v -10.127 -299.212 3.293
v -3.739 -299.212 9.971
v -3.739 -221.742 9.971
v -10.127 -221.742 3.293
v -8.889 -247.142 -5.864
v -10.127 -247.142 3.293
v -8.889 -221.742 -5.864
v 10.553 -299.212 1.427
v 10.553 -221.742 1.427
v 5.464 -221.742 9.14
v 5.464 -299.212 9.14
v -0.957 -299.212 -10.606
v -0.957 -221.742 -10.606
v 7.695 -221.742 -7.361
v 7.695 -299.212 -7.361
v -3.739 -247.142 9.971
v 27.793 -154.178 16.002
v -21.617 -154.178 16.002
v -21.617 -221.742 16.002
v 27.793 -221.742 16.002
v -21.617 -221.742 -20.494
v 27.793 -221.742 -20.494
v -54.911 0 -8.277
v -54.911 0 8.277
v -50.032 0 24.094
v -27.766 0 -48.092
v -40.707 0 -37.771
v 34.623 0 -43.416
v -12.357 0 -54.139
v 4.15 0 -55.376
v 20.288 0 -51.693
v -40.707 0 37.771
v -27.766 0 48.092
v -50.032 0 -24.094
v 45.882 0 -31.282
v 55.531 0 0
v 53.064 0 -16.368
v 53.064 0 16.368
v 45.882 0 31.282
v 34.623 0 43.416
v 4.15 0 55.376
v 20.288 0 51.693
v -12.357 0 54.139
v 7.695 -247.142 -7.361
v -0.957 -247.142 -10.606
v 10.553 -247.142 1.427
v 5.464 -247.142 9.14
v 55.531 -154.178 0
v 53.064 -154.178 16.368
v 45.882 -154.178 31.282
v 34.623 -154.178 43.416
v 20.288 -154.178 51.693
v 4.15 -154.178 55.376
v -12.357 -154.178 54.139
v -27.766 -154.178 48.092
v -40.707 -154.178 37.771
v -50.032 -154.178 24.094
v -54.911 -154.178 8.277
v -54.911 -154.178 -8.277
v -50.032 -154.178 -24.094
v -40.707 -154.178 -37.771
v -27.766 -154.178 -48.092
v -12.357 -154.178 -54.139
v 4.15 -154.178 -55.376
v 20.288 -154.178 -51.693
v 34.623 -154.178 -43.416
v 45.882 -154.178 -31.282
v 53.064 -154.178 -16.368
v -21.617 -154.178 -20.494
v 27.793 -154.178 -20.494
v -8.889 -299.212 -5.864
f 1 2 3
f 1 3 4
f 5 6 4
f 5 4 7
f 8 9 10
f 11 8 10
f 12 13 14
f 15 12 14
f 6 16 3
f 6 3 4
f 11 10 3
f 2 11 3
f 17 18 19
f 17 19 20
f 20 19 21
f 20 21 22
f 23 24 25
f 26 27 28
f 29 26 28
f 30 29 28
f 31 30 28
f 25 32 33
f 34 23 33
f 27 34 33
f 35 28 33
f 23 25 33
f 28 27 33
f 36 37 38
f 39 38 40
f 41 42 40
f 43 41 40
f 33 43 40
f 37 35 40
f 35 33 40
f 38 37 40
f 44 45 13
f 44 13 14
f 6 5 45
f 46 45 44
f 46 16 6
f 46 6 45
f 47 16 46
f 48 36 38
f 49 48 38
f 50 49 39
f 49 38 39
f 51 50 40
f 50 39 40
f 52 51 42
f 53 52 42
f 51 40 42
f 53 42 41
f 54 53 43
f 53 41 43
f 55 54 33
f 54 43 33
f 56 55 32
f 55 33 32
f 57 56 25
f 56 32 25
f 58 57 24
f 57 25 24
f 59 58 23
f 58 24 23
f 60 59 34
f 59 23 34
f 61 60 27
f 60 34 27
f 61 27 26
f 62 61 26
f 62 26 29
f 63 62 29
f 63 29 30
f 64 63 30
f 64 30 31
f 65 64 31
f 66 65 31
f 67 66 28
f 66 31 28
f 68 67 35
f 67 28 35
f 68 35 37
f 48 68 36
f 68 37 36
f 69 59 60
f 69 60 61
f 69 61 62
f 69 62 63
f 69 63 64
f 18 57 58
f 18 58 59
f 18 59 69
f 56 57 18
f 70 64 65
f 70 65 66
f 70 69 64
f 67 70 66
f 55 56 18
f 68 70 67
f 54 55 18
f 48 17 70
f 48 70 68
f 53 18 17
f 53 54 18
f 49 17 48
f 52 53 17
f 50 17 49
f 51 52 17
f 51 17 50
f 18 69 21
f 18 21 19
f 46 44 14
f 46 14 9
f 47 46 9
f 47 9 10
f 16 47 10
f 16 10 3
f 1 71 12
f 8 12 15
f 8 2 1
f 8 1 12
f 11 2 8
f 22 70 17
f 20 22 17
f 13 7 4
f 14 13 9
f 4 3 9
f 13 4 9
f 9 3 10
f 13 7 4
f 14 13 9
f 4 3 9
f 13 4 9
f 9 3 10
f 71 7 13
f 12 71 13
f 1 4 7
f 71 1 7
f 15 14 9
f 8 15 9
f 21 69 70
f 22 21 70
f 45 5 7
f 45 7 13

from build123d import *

# Parameters (mm, degrees)
F0_R     = 55.531356
F1_DEPTH = 154.178
F2_W     = 49.409683
F2_H     = 36.495792
F3_DEPTH = 67.564
F5_DEPTH = 25.4
F6_DEPTH = 77.47


with BuildPart() as f1:
    # F0 (on Front) → F1 (new body)
    with BuildSketch(Plane.XZ):
        Circle(F0_R)
    extrude(amount=F1_DEPTH)

    # F2 (on face) → F3 (join)
    with BuildSketch(Plane.XZ.offset(154.178)):
        with Locations((3.088105, -2.245895)):
            Rectangle(F2_W, F2_H)
    extrude(amount=F3_DEPTH)


with BuildPart() as f5:
    # F4 (on face) → F5 (new body)
    with BuildSketch(Plane.XZ.offset(221.742)):
        Polygon((-0.957422, -10.605928), (7.695106, -7.361231), (10.553062, 1.426624), (5.464347, 9.140202), (-3.739133, 9.971021), (-10.126969, 3.293458), (-8.888991, -5.864146), align=None)
    extrude(amount=F5_DEPTH)


with BuildPart() as f6:
    # F4 (on face) → F6 (new body)
    with BuildSketch(Plane.XZ.offset(221.742)):
        Polygon((-0.957422, -10.605928), (7.695106, -7.361231), (10.553062, 1.426624), (5.464347, 9.140202), (-3.739133, 9.971021), (-10.126969, 3.293458), (-8.888991, -5.864146), align=None)
    extrude(amount=F6_DEPTH)


solid = Compound([f1.part, f5.part, f6.part])
